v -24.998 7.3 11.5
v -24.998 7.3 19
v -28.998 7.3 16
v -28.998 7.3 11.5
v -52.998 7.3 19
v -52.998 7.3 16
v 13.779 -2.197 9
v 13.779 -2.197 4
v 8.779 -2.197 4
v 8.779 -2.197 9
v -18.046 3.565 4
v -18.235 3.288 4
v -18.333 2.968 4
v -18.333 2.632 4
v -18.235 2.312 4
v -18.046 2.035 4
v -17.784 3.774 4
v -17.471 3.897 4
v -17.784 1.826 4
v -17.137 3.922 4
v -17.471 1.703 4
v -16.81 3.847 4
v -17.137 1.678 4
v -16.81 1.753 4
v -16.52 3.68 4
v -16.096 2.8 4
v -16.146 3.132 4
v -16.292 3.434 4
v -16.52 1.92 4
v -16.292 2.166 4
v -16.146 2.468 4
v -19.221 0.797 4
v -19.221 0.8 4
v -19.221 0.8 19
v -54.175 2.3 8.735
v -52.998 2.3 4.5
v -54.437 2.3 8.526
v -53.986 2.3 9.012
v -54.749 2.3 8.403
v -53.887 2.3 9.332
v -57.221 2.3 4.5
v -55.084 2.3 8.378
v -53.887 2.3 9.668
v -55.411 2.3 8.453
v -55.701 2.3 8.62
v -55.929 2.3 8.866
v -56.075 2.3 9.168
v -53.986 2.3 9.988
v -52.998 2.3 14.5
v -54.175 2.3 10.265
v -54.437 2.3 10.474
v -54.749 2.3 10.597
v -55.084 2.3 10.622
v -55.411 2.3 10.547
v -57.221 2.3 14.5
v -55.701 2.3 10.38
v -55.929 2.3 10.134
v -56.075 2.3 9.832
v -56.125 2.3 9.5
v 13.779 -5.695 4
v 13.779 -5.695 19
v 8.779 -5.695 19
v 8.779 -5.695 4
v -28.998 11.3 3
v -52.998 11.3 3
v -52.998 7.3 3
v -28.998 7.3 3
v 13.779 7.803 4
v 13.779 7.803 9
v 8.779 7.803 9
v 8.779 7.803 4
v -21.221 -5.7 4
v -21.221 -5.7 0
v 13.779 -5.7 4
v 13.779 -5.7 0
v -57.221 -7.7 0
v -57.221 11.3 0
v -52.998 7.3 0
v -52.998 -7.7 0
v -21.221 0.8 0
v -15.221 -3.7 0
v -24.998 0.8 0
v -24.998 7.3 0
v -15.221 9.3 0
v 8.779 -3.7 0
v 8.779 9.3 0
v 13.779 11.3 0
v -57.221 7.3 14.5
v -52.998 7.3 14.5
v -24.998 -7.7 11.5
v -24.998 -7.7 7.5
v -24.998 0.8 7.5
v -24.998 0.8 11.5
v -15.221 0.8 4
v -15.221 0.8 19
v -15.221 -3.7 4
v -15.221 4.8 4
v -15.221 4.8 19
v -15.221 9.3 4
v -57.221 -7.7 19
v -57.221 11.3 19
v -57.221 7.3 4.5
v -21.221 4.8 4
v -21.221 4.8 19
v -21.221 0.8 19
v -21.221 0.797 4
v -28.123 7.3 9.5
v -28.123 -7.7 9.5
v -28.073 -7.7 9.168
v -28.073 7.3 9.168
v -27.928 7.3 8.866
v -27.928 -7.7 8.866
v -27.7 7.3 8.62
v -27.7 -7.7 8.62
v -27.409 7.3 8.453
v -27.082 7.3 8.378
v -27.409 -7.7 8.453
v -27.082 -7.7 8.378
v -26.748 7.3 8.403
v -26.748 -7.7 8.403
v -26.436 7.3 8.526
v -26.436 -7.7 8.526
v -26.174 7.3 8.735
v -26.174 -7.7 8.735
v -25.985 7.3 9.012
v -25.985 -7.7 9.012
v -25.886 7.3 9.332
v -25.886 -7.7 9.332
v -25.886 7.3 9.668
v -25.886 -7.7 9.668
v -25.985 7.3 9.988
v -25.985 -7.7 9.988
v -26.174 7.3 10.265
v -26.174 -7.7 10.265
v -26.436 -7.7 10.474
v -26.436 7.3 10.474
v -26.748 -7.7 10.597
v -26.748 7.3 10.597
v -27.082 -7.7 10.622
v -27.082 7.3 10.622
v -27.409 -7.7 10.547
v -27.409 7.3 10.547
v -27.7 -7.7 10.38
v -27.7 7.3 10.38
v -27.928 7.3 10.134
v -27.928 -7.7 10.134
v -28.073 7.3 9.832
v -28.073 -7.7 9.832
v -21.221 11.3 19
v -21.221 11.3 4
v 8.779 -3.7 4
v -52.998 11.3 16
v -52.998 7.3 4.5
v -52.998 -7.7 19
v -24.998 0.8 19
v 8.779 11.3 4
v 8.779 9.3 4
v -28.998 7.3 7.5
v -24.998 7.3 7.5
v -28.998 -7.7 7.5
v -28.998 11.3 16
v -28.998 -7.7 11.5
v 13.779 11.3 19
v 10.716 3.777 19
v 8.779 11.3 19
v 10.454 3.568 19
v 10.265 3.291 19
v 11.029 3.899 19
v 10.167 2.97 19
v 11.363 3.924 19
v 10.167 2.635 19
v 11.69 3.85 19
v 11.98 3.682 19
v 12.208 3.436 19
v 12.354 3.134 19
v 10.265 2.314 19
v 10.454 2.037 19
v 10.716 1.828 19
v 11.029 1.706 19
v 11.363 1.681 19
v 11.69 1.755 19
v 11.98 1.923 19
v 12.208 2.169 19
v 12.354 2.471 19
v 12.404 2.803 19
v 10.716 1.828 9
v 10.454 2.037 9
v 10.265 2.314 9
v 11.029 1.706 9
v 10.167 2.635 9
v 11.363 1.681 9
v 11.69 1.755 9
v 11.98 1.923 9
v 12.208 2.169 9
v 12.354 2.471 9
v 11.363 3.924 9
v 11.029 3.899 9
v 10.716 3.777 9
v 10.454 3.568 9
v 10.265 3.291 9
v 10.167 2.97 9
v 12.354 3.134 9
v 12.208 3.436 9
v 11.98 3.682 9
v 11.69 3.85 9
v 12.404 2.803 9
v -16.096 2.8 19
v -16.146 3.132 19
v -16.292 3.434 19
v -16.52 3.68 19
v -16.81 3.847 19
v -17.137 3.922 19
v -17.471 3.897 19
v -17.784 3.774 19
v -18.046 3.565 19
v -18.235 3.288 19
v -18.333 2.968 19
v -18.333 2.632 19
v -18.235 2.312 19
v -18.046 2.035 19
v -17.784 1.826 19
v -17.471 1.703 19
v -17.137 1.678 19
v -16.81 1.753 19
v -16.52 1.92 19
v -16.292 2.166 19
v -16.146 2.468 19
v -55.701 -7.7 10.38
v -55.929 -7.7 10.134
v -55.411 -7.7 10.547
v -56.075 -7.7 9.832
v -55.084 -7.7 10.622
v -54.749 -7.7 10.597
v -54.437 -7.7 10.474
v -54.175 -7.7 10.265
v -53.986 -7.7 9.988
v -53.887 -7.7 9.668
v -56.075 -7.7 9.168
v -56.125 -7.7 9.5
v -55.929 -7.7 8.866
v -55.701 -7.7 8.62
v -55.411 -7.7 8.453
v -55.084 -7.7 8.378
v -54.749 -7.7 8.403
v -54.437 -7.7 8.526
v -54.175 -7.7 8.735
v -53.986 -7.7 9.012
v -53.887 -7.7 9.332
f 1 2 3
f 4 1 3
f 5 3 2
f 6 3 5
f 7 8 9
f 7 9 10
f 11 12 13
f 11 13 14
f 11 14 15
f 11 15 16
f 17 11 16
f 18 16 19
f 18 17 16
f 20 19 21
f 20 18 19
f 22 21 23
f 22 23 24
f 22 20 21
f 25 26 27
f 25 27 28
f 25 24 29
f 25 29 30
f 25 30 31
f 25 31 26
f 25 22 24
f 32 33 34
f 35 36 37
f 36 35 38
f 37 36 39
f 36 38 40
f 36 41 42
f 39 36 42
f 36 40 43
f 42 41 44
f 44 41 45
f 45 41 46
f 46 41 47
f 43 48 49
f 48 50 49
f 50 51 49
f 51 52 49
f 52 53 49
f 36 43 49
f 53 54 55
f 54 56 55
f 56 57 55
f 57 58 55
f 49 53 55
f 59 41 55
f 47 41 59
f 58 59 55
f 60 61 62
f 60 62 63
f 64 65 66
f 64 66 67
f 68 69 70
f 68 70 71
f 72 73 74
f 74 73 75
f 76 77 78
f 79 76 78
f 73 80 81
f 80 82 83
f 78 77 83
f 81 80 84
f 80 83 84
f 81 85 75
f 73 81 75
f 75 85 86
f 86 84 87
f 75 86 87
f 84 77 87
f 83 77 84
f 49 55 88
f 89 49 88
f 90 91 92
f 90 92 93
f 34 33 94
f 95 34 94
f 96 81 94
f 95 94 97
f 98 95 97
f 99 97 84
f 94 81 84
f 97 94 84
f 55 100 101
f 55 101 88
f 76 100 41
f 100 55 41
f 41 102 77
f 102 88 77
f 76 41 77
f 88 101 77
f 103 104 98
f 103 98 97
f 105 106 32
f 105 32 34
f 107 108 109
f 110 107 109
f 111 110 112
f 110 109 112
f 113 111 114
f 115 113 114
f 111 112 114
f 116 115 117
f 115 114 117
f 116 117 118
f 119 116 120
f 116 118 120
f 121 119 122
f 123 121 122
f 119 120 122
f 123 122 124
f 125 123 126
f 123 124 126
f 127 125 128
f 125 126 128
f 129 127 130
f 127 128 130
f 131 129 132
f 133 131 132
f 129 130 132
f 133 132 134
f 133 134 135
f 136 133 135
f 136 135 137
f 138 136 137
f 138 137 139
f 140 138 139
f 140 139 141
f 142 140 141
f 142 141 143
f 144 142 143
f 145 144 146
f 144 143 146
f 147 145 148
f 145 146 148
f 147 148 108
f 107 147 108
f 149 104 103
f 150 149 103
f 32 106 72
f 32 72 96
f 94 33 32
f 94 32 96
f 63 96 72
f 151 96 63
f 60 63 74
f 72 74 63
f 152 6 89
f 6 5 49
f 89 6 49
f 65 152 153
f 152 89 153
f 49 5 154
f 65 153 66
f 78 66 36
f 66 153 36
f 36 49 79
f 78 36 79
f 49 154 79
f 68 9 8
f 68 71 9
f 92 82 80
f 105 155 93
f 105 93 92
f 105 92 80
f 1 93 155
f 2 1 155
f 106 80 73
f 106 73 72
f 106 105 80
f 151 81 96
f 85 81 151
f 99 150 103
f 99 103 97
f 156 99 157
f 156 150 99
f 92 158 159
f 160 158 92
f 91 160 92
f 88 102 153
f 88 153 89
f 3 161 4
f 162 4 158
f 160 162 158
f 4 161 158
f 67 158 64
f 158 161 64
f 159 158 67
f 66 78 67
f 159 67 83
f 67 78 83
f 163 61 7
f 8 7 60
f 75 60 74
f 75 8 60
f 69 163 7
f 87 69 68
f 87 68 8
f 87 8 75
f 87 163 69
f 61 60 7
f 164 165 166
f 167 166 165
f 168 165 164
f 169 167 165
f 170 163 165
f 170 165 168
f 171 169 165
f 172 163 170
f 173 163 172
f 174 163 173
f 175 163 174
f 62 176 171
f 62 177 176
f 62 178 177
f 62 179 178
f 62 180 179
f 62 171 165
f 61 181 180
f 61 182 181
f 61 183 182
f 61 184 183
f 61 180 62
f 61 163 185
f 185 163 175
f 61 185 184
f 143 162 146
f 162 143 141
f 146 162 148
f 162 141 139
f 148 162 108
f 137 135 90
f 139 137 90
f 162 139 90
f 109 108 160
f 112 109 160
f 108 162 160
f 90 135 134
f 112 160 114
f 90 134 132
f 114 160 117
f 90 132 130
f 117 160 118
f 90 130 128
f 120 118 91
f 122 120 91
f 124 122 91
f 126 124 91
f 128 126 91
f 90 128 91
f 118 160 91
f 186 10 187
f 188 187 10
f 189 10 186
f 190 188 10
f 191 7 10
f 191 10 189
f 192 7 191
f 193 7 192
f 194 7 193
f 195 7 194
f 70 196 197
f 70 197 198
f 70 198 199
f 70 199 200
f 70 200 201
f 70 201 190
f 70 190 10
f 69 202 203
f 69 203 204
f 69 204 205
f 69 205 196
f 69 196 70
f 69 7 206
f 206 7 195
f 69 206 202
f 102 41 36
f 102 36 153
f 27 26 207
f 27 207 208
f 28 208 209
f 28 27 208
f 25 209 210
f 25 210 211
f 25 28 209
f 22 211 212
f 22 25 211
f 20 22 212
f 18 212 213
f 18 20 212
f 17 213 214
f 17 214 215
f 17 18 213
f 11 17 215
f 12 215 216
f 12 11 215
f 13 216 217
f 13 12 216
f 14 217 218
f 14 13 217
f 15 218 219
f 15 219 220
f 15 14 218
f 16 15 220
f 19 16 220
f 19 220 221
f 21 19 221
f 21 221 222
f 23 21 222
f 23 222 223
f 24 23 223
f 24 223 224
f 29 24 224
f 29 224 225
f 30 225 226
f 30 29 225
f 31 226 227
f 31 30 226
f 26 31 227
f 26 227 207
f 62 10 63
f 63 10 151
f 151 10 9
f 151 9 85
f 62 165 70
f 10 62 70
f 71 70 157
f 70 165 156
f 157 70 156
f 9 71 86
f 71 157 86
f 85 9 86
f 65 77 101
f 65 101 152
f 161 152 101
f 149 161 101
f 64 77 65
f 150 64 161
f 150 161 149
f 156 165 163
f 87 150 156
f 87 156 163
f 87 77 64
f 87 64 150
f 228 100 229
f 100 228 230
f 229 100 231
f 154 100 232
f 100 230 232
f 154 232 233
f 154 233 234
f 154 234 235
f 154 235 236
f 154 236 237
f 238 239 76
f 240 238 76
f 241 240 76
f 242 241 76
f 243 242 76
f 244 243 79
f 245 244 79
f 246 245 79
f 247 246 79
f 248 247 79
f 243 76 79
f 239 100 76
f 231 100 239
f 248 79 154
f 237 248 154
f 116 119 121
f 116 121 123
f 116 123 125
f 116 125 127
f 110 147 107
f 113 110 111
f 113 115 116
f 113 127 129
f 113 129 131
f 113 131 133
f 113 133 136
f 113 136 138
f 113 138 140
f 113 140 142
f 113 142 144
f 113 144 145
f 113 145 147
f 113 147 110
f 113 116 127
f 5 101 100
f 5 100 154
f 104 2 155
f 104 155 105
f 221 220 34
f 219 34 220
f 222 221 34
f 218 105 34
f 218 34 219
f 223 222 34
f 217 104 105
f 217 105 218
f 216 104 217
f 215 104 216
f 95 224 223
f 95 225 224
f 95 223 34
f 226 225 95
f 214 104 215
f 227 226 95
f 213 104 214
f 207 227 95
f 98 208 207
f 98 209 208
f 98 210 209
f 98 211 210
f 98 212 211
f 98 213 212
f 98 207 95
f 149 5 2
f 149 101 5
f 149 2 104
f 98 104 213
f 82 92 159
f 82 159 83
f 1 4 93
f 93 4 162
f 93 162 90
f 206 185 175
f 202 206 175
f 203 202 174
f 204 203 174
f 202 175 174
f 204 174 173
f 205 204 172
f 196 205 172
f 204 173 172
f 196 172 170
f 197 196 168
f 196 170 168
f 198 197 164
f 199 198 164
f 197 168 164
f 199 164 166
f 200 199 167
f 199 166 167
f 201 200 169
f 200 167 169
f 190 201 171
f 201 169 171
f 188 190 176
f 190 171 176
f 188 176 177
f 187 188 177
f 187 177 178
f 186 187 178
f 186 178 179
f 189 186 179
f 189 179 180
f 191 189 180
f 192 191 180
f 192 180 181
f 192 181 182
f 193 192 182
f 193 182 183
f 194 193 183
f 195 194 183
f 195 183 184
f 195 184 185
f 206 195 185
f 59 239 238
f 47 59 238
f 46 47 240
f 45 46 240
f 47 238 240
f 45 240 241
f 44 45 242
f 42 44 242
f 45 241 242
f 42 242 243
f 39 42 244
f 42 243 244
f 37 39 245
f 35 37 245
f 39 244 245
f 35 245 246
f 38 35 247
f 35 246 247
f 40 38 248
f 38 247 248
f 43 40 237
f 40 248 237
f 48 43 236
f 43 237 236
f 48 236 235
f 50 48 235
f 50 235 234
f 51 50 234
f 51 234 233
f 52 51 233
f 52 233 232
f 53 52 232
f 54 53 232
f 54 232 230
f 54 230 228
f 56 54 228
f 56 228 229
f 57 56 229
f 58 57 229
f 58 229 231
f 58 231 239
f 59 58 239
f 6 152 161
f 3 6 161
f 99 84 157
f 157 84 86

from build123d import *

# Parameters (mm, degrees)
SKETCH_1_W           = 35
SKETCH_1_H           = 17
EXTRUDE_1_DEPTH      = 4
SKETCH_2_W           = 24
SKETCH_2_H           = 13
CUT_EXTRUDE_1_DEPTH  = 6
EXTRUDE_2_DEPTH      = 5
SKETCH_5_W           = 4
SKETCH_5_H           = 4
SKETCH_5_R           = 1.125
EXTRUDE_3_DEPTH      = 15
SKETCH_6_R           = 1.125
CUT_EXTRUDE_2_DEPTH  = 15
EXTRUDE_5_DEPTH      = 2
SKETCH_8_W           = 36
SKETCH_8_H           = 19
EXTRUDE_6_DEPTH      = 8.3
EXTRUDE_6_DEPTH_BACK = 10.7
SKETCH_9_W           = 24
SKETCH_9_H           = 13
CUT_EXTRUDE_3_DEPTH  = 22
SKETCH_11_R          = 1.125
CUT_EXTRUDE_4_DEPTH  = 15
CUT_EXTRUDE_5_DEPTH  = 15
SKETCH_13_W          = 3.77735738
SKETCH_13_H          = 19
CUT_EXTRUDE_6_DEPTH  = 8.5
SKETCH_14_W          = 10
SKETCH_14_H          = 5
CUT_EXTRUDE_7_DEPTH  = 10


with BuildPart() as part:
    # 草圖1 → 填料-伸長1 (new body)
    with BuildSketch(Plane.XY):
        with Locations((-3.721052632, 2.8)):
            Rectangle(SKETCH_1_W, SKETCH_1_H)
    extrude(amount=EXTRUDE_1_DEPTH)

    # 草圖2 → 除料-伸長1 (cut)
    with BuildSketch(Plane.XY):
        with Locations((-3.221052632, 2.8)):
            Rectangle(SKETCH_2_W, SKETCH_2_H)
    extrude(amount=CUT_EXTRUDE_1_DEPTH, mode=Mode.SUBTRACT)

    # 草圖3 → 填料-伸長2 (add)
    with BuildSketch(Plane(origin=(13.778947368, 0, 0), x_dir=(0, 0, -1), z_dir=(1, 0, 0))):
        Polygon((-4, 7.802538439), (-4, 11.3), (-19, 11.3), (-19, -5.694923122), (-4, -5.694923122), (-4, -2.197461561), (-9, -2.197461561), (-9, 7.802538439), align=None)
    extrude(amount=-EXTRUDE_2_DEPTH)

    # 草圖5 → 填料-伸長3 (add)
    with BuildSketch(Plane.XY.offset(4)):
        with Locations((-17.221052632, 2.8)):
            Rectangle(SKETCH_5_W, SKETCH_5_H)
        with Locations((-17.221052632, 2.8)):
            Circle(SKETCH_5_R, mode=Mode.SUBTRACT)
    extrude(amount=EXTRUDE_3_DEPTH)

    # 草圖6 → 除料-伸長2 (cut)
    with BuildSketch(Plane.XY.offset(19)):
        with Locations((11.278947368, 2.802538439)):
            Circle(SKETCH_6_R)
    extrude(amount=-CUT_EXTRUDE_2_DEPTH, mode=Mode.SUBTRACT)

    # 草圖7 → 填料-伸長5 (add)
    with BuildSketch(Plane.ZY.offset(21.221052632)):
        Polygon((4, 4.8), (4, 0.796544916), (19, 0.8), (19, 4.8), align=None)
    extrude(amount=-EXTRUDE_5_DEPTH)

    # 草圖8 → 填料-伸長6 (add, two sides)
    with BuildSketch(Plane(origin=(0, 3, 0), x_dir=(1, 0, 0), z_dir=(0, 1, 0))) as extrude_6_sk:
        with Locations((-39.221052632, -9.5)):
            Rectangle(SKETCH_8_W, SKETCH_8_H)
    extrude(amount=EXTRUDE_6_DEPTH)
    extrude(extrude_6_sk.sketch, amount=-EXTRUDE_6_DEPTH_BACK)

    # 草圖9 → 除料-伸長3 (cut)
    with BuildSketch(Plane(origin=(0, 11.3, 0), x_dir=(1, 0, 0), z_dir=(0, 1, 0))):
        with Locations((-40.998410012, -9.5)):
            Rectangle(SKETCH_9_W, SKETCH_9_H)
    extrude(amount=-CUT_EXTRUDE_3_DEPTH, mode=Mode.SUBTRACT)

    # 草圖11 → 除料-伸長4 (cut)
    with BuildSketch(Plane(origin=(0, -7.7, 0), x_dir=(-1, 0, 0), z_dir=(0, -1, 0))):
        with Locations((26.998410012, -9.5)):
            Circle(SKETCH_11_R)
        with Locations((54.999503046, -9.5)):
            Circle(SKETCH_11_R)
    extrude(amount=-CUT_EXTRUDE_4_DEPTH, mode=Mode.SUBTRACT)

    # 草圖12 → 除料-伸長5 (cut)
    with BuildSketch(Plane(origin=(0, -7.7, 0), x_dir=(-1, 0, 0), z_dir=(0, -1, 0))):
        Polygon((28.998410012, -7.5), (24.998410012, -7.5), (24.998410012, 0), (52.998410012, 0), (52.998410012, -3), (28.998410012, -3), align=None)
        Polygon((24.998410012, -11.5), (24.998410012, -19), (52.998410012, -19), (52.998410012, -16), (28.998410012, -16), (28.998410012, -11.5), align=None)
    extrude(amount=-CUT_EXTRUDE_5_DEPTH, mode=Mode.SUBTRACT)

    # 草圖13 → 除料-伸長6 (cut)
    with BuildSketch(Plane.XZ.offset(7.7)):
        with Locations((-23.109731322, 9.5)):
            Rectangle(SKETCH_13_W, SKETCH_13_H)
    extrude(amount=-CUT_EXTRUDE_6_DEPTH, mode=Mode.SUBTRACT)

    # 草圖14 → 除料-伸長7 (cut)
    with BuildSketch(Plane.ZY.offset(57.221052632)):
        with Locations((9.5, 4.8)):
            Rectangle(SKETCH_14_W, SKETCH_14_H)
    extrude(amount=-CUT_EXTRUDE_7_DEPTH, mode=Mode.SUBTRACT)


solid = part.part
